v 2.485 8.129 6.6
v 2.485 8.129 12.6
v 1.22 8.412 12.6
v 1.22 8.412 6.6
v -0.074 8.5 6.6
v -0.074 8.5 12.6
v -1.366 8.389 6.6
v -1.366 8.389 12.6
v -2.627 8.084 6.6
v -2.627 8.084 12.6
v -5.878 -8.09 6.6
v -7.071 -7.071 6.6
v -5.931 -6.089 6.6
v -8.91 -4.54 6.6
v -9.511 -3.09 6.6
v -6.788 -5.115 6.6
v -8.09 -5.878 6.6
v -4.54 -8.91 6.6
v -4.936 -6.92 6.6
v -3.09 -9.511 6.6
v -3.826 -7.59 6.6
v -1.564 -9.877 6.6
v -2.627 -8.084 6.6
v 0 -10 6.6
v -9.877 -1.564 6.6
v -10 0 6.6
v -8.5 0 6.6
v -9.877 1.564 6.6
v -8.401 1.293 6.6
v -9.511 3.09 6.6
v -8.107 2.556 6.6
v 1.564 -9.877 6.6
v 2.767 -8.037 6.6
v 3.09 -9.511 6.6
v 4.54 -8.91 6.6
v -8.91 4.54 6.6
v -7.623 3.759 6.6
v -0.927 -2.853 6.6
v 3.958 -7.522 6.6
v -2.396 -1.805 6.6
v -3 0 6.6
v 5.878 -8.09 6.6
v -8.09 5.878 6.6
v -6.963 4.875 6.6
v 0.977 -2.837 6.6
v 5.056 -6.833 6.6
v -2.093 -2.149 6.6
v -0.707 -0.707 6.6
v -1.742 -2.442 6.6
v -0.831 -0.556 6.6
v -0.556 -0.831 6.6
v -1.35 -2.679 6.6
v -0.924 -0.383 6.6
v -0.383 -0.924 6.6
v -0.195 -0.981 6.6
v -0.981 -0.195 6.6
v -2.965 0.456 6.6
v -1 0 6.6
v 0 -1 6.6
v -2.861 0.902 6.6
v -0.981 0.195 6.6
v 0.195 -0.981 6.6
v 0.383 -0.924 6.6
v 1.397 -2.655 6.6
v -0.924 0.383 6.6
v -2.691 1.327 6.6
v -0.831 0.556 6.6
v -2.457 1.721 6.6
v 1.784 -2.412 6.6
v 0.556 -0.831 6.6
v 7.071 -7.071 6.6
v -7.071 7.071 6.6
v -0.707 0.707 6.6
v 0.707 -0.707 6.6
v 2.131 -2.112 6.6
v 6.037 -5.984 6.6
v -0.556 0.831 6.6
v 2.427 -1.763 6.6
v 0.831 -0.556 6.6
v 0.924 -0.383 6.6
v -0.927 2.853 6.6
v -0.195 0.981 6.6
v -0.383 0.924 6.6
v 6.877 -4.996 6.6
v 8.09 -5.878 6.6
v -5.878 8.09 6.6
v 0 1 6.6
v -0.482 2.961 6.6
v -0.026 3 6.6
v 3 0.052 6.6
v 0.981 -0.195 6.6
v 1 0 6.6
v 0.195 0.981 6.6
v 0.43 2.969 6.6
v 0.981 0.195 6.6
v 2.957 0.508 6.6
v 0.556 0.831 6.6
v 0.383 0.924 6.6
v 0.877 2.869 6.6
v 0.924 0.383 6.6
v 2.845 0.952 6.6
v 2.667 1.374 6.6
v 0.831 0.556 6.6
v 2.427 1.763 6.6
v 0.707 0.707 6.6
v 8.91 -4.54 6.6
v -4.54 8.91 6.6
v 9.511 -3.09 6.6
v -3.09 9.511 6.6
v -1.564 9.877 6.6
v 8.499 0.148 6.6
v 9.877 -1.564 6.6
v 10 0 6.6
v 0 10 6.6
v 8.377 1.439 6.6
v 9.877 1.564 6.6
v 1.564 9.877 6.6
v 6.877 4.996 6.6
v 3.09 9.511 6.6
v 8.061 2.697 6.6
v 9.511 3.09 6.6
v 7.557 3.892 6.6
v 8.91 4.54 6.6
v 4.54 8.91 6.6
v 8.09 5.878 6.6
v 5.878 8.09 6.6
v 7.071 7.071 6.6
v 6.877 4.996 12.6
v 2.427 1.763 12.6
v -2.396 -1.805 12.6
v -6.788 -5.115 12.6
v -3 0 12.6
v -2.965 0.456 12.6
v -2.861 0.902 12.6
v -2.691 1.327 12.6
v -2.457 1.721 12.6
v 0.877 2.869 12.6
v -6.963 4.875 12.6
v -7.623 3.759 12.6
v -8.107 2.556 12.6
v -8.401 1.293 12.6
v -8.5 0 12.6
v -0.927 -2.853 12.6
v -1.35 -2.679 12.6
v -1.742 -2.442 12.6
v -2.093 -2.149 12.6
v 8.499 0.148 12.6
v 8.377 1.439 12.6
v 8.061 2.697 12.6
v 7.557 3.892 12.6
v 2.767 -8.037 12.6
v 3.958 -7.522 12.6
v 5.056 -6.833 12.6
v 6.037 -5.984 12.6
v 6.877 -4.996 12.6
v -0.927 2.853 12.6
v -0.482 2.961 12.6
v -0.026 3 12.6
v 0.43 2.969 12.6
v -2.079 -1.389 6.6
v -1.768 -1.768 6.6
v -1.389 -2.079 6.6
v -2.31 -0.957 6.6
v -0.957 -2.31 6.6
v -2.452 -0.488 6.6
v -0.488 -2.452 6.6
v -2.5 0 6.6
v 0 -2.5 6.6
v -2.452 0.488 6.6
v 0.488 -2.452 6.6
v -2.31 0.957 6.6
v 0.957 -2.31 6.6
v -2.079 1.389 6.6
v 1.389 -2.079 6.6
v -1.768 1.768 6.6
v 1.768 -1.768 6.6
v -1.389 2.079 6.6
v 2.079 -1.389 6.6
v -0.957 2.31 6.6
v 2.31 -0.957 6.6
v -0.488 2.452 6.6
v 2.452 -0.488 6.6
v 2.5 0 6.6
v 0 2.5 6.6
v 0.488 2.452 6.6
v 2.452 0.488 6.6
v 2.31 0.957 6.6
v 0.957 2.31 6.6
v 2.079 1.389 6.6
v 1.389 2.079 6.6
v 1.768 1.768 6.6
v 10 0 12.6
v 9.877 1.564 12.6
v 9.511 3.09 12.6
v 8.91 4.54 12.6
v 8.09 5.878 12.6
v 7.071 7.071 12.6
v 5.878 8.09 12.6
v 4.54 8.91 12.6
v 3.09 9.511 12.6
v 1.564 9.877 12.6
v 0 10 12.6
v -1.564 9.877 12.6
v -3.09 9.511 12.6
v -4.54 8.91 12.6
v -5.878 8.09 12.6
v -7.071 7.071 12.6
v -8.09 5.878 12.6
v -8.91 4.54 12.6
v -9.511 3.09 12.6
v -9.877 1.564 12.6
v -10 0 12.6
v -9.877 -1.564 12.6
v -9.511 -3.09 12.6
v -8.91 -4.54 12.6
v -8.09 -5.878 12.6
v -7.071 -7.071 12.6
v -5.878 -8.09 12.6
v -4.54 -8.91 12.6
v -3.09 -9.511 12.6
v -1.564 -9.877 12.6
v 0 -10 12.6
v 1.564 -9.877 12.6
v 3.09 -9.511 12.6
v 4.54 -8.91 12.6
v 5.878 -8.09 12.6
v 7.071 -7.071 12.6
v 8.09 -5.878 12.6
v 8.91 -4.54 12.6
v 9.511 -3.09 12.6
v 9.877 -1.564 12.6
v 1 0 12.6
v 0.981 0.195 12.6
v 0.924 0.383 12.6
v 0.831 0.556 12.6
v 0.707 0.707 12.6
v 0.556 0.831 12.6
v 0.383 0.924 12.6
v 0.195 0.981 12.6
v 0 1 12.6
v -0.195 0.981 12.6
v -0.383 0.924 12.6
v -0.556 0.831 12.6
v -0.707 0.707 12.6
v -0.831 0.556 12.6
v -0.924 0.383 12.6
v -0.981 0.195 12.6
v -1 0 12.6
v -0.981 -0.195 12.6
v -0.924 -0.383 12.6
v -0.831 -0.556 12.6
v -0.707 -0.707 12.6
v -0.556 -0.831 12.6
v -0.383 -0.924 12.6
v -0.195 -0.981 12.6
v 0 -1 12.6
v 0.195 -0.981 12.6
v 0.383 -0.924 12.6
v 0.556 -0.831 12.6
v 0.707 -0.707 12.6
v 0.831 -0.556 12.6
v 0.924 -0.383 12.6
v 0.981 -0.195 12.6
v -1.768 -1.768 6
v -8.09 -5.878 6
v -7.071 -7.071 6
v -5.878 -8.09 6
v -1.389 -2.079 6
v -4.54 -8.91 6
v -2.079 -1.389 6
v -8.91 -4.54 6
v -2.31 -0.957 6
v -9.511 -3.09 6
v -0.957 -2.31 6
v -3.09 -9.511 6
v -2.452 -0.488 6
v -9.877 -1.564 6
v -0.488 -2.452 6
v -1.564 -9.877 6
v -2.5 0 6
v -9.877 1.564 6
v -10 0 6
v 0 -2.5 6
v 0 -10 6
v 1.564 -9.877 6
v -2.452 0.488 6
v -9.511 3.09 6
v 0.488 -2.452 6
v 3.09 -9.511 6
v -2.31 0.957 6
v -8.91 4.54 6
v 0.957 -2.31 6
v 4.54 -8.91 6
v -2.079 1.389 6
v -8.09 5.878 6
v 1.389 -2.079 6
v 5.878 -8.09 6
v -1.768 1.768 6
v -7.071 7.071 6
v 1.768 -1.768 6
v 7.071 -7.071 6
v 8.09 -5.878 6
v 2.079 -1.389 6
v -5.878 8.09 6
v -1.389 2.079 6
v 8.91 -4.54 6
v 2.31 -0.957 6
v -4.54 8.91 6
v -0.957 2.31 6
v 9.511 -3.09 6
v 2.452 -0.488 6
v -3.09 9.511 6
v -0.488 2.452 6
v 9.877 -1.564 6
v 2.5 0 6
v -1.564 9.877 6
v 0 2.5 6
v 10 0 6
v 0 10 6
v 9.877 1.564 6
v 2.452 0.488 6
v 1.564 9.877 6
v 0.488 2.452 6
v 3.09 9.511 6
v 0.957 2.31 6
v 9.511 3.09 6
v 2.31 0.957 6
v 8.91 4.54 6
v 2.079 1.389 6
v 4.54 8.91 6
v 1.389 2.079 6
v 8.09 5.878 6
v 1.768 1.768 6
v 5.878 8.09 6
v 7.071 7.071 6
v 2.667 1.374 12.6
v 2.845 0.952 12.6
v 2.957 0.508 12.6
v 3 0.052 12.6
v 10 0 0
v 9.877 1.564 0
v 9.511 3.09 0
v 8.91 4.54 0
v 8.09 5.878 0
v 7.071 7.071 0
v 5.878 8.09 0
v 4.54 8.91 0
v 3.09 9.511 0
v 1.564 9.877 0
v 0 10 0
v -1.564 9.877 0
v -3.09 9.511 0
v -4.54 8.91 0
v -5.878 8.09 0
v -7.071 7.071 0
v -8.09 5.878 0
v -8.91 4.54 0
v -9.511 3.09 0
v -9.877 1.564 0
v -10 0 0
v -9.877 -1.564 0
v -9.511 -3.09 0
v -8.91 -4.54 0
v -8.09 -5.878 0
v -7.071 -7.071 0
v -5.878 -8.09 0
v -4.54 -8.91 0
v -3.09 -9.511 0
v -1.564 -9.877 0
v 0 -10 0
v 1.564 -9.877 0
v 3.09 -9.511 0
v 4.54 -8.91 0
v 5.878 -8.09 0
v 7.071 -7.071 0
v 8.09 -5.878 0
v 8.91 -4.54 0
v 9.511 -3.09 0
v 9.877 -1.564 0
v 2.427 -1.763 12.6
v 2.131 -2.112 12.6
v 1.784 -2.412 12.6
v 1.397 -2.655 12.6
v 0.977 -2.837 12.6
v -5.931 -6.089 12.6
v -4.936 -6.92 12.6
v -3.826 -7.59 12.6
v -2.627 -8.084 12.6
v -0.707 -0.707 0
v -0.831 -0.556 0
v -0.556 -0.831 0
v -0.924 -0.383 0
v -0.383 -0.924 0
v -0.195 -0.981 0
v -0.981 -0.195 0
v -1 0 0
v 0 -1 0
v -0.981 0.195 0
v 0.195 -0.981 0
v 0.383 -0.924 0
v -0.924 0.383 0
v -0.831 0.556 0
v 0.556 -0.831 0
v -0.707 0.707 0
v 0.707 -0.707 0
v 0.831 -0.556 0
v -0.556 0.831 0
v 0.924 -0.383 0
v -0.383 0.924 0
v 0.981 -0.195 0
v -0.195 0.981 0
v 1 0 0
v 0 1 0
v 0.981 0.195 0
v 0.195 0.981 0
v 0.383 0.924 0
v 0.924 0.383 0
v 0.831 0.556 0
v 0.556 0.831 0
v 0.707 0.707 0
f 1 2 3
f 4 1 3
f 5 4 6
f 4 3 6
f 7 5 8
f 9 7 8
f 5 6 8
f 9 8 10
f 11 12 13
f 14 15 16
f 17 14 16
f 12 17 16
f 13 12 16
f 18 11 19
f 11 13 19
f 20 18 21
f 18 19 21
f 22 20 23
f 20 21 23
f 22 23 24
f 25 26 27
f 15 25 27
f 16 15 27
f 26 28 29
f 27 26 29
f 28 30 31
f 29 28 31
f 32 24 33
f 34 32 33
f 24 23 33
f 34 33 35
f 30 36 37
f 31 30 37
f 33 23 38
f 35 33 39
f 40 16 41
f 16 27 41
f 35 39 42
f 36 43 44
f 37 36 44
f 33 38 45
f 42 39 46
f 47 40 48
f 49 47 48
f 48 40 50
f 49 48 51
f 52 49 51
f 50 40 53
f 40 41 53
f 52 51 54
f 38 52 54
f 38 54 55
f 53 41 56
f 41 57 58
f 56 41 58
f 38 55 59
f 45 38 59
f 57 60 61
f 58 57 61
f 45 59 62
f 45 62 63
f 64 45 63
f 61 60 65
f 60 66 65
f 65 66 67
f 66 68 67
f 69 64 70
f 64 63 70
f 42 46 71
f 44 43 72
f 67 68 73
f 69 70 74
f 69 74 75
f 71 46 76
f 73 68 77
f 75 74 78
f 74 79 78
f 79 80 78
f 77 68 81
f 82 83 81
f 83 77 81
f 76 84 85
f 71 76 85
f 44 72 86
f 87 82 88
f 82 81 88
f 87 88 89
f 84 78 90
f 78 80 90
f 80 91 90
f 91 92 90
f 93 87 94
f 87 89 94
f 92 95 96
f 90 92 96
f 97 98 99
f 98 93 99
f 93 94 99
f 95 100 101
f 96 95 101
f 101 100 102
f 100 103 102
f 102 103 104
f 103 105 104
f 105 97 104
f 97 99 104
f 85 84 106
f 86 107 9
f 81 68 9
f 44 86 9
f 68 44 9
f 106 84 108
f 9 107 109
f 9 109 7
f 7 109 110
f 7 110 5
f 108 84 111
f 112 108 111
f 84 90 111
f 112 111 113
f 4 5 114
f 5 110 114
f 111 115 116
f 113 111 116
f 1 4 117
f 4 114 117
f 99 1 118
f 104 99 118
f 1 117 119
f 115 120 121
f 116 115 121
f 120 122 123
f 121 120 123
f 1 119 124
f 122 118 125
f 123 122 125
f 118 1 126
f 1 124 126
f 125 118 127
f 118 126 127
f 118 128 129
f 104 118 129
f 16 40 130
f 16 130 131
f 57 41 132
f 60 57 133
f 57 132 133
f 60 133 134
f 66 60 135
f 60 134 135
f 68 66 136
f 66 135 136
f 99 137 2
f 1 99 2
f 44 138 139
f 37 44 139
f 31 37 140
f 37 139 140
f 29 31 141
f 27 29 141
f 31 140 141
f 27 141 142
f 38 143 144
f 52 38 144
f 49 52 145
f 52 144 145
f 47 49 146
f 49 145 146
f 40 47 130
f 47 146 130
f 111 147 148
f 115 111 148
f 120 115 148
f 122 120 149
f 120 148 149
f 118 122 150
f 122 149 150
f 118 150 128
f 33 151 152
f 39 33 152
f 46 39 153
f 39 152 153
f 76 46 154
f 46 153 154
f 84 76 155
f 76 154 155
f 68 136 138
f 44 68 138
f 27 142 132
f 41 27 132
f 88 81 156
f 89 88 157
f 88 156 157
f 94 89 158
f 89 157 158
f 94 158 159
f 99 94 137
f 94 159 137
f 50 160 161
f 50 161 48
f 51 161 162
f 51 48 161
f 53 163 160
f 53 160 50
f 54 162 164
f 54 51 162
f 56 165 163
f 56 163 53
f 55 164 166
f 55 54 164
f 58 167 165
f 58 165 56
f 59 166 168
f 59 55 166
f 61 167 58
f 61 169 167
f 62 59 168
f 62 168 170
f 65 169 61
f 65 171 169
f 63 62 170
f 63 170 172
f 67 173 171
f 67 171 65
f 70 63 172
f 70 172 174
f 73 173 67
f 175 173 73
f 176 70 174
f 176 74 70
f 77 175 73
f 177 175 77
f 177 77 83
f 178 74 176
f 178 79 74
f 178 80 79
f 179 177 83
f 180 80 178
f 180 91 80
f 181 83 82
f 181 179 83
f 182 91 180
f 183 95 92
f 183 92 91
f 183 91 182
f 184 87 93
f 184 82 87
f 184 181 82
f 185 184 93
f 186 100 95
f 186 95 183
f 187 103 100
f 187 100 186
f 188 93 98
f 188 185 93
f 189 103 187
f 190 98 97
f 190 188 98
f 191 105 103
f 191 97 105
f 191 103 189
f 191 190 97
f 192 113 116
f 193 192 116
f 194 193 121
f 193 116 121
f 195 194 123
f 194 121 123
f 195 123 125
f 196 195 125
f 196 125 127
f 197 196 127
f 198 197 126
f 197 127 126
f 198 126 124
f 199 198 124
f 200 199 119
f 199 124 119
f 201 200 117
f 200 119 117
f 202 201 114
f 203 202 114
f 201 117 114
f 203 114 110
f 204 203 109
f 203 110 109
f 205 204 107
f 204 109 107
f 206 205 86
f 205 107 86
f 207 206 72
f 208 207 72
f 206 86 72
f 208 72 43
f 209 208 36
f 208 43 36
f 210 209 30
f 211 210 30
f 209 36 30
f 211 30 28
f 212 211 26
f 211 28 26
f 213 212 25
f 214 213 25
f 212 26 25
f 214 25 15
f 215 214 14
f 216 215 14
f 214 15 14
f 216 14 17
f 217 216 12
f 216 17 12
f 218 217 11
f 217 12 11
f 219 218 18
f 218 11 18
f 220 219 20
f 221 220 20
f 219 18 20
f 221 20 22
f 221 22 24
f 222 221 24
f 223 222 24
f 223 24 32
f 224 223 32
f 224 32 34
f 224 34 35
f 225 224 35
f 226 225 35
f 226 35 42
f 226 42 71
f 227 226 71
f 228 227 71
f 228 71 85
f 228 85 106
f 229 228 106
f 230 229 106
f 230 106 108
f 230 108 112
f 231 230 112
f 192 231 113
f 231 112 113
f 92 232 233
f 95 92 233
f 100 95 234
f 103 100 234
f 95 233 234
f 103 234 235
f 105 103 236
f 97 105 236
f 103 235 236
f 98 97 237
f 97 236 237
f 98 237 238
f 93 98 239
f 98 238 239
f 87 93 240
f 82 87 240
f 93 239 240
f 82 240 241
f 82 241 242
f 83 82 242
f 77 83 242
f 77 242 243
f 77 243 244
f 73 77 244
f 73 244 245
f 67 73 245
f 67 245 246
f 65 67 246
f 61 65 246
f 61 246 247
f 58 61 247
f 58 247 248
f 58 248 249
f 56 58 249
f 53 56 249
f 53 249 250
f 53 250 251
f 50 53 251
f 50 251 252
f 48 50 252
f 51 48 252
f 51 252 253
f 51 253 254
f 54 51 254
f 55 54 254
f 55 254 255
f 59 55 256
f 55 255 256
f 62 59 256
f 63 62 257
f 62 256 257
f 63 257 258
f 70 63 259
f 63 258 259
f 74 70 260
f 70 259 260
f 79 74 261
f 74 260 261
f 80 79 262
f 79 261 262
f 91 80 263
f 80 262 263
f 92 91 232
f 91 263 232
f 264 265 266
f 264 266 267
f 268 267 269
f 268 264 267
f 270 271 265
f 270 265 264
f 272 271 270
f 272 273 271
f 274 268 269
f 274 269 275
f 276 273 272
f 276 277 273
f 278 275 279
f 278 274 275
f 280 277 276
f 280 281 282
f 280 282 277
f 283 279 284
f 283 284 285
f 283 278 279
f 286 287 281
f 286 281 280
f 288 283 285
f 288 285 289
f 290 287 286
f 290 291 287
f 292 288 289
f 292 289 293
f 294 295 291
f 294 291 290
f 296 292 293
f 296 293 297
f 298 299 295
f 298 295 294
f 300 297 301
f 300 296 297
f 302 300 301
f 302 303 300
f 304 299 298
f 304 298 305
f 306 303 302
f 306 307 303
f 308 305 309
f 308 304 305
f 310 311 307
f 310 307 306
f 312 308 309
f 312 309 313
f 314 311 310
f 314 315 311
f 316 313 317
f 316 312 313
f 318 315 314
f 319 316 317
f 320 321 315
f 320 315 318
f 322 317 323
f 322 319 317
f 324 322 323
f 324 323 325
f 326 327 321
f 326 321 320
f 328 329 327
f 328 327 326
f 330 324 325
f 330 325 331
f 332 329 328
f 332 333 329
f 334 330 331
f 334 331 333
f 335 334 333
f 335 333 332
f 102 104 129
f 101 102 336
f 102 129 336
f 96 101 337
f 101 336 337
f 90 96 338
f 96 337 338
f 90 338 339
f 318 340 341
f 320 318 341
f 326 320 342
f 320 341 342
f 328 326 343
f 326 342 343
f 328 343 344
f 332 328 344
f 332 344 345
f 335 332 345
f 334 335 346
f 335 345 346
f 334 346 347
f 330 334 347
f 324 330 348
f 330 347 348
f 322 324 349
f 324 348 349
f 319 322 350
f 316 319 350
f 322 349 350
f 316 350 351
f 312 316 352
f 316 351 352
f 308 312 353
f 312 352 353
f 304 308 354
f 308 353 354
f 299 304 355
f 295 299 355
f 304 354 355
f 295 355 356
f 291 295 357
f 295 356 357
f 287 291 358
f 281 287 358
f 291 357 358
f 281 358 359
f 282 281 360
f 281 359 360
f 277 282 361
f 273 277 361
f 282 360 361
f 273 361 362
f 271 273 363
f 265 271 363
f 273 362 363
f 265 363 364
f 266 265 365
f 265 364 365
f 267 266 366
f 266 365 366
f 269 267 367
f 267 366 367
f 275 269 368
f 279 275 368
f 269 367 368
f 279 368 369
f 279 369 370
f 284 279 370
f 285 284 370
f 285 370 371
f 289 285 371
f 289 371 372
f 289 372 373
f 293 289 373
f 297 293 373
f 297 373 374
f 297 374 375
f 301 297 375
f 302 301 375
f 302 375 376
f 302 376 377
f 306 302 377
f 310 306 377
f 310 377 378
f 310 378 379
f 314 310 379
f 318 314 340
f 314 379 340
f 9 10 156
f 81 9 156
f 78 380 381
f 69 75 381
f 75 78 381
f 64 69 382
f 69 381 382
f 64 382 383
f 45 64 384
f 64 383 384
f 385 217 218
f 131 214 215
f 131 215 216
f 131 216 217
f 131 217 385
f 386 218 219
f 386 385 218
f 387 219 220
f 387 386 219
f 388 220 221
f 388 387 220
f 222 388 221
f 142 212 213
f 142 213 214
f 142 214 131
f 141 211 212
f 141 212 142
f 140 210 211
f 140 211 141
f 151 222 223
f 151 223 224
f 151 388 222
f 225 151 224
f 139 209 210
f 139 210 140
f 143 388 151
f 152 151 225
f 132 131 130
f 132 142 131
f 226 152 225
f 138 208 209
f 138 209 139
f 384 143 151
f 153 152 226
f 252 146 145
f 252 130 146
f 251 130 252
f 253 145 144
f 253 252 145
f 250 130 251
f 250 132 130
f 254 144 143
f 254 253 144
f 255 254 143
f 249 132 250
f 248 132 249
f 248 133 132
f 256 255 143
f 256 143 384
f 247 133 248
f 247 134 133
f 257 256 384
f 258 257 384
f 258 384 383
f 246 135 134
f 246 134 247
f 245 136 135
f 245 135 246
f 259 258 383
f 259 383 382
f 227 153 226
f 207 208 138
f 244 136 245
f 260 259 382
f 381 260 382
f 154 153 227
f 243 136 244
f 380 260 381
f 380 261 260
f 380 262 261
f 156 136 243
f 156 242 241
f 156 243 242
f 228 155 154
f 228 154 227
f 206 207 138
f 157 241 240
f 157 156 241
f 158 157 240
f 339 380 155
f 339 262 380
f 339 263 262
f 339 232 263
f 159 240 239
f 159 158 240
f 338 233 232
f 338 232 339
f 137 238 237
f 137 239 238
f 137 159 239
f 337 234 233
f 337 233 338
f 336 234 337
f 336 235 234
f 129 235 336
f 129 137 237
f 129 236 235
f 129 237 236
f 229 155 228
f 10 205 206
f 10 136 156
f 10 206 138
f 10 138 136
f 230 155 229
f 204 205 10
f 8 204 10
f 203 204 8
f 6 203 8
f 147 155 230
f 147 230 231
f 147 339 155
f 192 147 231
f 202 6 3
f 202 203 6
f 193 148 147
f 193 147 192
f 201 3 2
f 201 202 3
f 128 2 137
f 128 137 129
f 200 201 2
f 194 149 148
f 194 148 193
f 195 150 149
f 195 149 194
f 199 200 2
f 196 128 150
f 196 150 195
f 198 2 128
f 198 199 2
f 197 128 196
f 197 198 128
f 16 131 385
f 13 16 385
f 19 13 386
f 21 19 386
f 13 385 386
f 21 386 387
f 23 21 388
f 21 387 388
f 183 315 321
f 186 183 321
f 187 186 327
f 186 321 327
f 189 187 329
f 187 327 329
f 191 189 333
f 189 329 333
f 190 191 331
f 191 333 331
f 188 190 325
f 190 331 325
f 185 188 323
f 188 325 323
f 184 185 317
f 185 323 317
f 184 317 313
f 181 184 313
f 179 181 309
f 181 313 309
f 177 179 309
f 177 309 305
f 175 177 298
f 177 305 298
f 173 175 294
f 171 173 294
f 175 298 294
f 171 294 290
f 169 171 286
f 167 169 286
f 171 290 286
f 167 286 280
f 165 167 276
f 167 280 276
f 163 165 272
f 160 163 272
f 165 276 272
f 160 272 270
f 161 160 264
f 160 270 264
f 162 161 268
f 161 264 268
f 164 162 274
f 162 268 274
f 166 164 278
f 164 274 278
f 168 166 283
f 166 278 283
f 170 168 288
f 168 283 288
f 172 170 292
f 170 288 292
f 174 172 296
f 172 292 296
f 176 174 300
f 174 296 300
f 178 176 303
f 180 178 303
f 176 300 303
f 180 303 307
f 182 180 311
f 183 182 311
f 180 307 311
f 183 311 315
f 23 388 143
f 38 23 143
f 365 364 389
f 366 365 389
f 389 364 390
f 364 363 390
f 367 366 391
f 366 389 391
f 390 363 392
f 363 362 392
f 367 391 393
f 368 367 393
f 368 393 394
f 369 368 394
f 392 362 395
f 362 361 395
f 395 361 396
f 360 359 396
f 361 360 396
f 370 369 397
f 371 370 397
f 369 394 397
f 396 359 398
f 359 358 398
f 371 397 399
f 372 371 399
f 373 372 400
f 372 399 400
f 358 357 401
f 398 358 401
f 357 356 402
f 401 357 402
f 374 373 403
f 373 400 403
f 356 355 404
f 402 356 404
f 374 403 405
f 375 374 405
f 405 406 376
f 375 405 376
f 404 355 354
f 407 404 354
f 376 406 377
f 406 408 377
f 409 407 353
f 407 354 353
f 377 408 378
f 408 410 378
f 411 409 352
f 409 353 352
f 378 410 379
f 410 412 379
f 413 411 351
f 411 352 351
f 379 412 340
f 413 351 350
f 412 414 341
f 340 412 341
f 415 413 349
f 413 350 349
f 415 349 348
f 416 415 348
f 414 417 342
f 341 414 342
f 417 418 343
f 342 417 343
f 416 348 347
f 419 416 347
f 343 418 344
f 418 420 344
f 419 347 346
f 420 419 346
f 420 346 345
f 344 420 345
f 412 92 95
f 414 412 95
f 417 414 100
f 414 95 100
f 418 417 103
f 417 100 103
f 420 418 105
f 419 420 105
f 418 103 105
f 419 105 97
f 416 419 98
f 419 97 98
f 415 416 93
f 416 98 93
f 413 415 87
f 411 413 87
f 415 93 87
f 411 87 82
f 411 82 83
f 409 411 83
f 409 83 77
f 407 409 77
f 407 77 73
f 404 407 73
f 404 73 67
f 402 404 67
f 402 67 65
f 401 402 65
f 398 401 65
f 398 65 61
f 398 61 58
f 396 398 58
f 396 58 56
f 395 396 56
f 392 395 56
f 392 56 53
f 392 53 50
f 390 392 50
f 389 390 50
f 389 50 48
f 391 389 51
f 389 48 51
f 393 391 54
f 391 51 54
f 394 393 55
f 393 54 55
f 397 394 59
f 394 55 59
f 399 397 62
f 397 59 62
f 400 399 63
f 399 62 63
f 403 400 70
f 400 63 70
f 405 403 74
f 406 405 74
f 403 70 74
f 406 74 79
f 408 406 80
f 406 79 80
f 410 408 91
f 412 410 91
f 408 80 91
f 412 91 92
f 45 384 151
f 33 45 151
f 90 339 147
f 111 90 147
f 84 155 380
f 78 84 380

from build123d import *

# Parameters (mm, degrees)
F0_R     = 10
F1_DEPTH = 6
F2_R     = 2.5
F3_DEPTH = 0.6
F4_R     = 10
F5_DEPTH = 6
F6_R     = 1
F7_DEPTH = 25
F9_DEPTH = 12.601


with BuildPart() as f1:
    # F0 (on Top) → F1 (new body)
    with BuildSketch(Plane.XY):
        Circle(F0_R)
    extrude(amount=F1_DEPTH)

    # F2 (on face) → F3 (join)
    with BuildSketch(Plane.XY.offset(6)):
        Circle(F2_R)
    extrude(amount=F3_DEPTH)


with BuildPart() as f5:
    # F4 (on face) → F5 (new body)
    with BuildSketch(Plane.XY.offset(6.6)):
        Circle(F4_R)
    extrude(amount=F5_DEPTH)


with BuildPart() as f7_tool:
    # F6 (on face) → F7 (new body)
    with BuildSketch(Plane.XY.offset(12.6)):
        Circle(F6_R)
    extrude(amount=-F7_DEPTH)


with BuildPart() as f1_1:
    add(f1.part)

    # F7: cut by f7_tool
    add(f7_tool.part, mode=Mode.SUBTRACT)


with BuildPart() as f5_1:
    add(f5.part)

    # F7: cut by f7_tool
    add(f7_tool.part, mode=Mode.SUBTRACT)

    # F8 (on face) → F9 (cut, through all)
    with BuildSketch(Plane.XY.offset(12.6)):
        with BuildLine():
            Line((-8.5, 0), (-3, 0))
            ThreePointArc((-3, 0), (-2.8611508522, 0.9021173985), (-2.4574561329, 1.7207293091))
            Line((-2.4574561329, 1.7207293091), (-6.9627923765, 4.875399709))
            ThreePointArc((-6.9627923765, 4.875399709), (-8.1065940814, 2.5559992958), (-8.5, 0))
        make_face()
        with BuildLine():
            Line((-2.3959065301, -1.8054450695), (-6.7884018354, -5.1154276968))
            ThreePointArc((-6.7884018354, -5.1154276968), (-4.9359751235, -6.919981906), (-2.6266444522, -8.0839803885))
            Line((-2.6266444522, -8.0839803885), (-0.9270509831, -2.8531695489))
            ThreePointArc((-0.9270509831, -2.8531695489), (-1.7421088671, -2.4423465551), (-2.3959065301, -1.8054450695))
        make_face()
        with BuildLine():
            Line((0.9767044634, -2.8365557268), (2.7673293129, -8.0369078926))
            ThreePointArc((2.7673293129, -8.0369078926), (5.0559936874, -6.8327833152), (6.8766444522, -4.9961746445))
            Line((6.8766444522, -4.9961746445), (2.4270509831, -1.7633557569))
            ThreePointArc((2.4270509831, -1.7633557569), (1.7844683603, -2.4115705819), (0.9767044634, -2.8365557268))
        make_face()
        with BuildLine():
            Line((2.9995430855, 0.0523572193), (8.4987054088, 0.1483454547))
            ThreePointArc((8.4987054088, 0.1483454547), (8.0607510693, 2.6970895794), (6.8766444522, 4.9961746445))
            Line((6.8766444522, 4.9961746445), (2.4270509831, 1.7633557569))
            ThreePointArc((2.4270509831, 1.7633557569), (2.8449709656, 0.9519139692), (2.9995430855, 0.0523572193))
        make_face()
        with BuildLine():
            Line((0.8771151142, 2.8689142679), (2.4851594901, 8.1285904257))
            ThreePointArc((2.4851594901, 8.1285904257), (-0.0741755517, 8.499676346), (-2.6266444522, 8.0839803885))
            Line((-2.6266444522, 8.0839803885), (-0.9270509831, 2.8531695489))
            ThreePointArc((-0.9270509831, 2.8531695489), (-0.0261796065, 2.9998857692), (0.8771151142, 2.8689142679))
        make_face()
    extrude(amount=-F9_DEPTH, mode=Mode.SUBTRACT)


solid = Compound([f1_1.part, f5_1.part])
